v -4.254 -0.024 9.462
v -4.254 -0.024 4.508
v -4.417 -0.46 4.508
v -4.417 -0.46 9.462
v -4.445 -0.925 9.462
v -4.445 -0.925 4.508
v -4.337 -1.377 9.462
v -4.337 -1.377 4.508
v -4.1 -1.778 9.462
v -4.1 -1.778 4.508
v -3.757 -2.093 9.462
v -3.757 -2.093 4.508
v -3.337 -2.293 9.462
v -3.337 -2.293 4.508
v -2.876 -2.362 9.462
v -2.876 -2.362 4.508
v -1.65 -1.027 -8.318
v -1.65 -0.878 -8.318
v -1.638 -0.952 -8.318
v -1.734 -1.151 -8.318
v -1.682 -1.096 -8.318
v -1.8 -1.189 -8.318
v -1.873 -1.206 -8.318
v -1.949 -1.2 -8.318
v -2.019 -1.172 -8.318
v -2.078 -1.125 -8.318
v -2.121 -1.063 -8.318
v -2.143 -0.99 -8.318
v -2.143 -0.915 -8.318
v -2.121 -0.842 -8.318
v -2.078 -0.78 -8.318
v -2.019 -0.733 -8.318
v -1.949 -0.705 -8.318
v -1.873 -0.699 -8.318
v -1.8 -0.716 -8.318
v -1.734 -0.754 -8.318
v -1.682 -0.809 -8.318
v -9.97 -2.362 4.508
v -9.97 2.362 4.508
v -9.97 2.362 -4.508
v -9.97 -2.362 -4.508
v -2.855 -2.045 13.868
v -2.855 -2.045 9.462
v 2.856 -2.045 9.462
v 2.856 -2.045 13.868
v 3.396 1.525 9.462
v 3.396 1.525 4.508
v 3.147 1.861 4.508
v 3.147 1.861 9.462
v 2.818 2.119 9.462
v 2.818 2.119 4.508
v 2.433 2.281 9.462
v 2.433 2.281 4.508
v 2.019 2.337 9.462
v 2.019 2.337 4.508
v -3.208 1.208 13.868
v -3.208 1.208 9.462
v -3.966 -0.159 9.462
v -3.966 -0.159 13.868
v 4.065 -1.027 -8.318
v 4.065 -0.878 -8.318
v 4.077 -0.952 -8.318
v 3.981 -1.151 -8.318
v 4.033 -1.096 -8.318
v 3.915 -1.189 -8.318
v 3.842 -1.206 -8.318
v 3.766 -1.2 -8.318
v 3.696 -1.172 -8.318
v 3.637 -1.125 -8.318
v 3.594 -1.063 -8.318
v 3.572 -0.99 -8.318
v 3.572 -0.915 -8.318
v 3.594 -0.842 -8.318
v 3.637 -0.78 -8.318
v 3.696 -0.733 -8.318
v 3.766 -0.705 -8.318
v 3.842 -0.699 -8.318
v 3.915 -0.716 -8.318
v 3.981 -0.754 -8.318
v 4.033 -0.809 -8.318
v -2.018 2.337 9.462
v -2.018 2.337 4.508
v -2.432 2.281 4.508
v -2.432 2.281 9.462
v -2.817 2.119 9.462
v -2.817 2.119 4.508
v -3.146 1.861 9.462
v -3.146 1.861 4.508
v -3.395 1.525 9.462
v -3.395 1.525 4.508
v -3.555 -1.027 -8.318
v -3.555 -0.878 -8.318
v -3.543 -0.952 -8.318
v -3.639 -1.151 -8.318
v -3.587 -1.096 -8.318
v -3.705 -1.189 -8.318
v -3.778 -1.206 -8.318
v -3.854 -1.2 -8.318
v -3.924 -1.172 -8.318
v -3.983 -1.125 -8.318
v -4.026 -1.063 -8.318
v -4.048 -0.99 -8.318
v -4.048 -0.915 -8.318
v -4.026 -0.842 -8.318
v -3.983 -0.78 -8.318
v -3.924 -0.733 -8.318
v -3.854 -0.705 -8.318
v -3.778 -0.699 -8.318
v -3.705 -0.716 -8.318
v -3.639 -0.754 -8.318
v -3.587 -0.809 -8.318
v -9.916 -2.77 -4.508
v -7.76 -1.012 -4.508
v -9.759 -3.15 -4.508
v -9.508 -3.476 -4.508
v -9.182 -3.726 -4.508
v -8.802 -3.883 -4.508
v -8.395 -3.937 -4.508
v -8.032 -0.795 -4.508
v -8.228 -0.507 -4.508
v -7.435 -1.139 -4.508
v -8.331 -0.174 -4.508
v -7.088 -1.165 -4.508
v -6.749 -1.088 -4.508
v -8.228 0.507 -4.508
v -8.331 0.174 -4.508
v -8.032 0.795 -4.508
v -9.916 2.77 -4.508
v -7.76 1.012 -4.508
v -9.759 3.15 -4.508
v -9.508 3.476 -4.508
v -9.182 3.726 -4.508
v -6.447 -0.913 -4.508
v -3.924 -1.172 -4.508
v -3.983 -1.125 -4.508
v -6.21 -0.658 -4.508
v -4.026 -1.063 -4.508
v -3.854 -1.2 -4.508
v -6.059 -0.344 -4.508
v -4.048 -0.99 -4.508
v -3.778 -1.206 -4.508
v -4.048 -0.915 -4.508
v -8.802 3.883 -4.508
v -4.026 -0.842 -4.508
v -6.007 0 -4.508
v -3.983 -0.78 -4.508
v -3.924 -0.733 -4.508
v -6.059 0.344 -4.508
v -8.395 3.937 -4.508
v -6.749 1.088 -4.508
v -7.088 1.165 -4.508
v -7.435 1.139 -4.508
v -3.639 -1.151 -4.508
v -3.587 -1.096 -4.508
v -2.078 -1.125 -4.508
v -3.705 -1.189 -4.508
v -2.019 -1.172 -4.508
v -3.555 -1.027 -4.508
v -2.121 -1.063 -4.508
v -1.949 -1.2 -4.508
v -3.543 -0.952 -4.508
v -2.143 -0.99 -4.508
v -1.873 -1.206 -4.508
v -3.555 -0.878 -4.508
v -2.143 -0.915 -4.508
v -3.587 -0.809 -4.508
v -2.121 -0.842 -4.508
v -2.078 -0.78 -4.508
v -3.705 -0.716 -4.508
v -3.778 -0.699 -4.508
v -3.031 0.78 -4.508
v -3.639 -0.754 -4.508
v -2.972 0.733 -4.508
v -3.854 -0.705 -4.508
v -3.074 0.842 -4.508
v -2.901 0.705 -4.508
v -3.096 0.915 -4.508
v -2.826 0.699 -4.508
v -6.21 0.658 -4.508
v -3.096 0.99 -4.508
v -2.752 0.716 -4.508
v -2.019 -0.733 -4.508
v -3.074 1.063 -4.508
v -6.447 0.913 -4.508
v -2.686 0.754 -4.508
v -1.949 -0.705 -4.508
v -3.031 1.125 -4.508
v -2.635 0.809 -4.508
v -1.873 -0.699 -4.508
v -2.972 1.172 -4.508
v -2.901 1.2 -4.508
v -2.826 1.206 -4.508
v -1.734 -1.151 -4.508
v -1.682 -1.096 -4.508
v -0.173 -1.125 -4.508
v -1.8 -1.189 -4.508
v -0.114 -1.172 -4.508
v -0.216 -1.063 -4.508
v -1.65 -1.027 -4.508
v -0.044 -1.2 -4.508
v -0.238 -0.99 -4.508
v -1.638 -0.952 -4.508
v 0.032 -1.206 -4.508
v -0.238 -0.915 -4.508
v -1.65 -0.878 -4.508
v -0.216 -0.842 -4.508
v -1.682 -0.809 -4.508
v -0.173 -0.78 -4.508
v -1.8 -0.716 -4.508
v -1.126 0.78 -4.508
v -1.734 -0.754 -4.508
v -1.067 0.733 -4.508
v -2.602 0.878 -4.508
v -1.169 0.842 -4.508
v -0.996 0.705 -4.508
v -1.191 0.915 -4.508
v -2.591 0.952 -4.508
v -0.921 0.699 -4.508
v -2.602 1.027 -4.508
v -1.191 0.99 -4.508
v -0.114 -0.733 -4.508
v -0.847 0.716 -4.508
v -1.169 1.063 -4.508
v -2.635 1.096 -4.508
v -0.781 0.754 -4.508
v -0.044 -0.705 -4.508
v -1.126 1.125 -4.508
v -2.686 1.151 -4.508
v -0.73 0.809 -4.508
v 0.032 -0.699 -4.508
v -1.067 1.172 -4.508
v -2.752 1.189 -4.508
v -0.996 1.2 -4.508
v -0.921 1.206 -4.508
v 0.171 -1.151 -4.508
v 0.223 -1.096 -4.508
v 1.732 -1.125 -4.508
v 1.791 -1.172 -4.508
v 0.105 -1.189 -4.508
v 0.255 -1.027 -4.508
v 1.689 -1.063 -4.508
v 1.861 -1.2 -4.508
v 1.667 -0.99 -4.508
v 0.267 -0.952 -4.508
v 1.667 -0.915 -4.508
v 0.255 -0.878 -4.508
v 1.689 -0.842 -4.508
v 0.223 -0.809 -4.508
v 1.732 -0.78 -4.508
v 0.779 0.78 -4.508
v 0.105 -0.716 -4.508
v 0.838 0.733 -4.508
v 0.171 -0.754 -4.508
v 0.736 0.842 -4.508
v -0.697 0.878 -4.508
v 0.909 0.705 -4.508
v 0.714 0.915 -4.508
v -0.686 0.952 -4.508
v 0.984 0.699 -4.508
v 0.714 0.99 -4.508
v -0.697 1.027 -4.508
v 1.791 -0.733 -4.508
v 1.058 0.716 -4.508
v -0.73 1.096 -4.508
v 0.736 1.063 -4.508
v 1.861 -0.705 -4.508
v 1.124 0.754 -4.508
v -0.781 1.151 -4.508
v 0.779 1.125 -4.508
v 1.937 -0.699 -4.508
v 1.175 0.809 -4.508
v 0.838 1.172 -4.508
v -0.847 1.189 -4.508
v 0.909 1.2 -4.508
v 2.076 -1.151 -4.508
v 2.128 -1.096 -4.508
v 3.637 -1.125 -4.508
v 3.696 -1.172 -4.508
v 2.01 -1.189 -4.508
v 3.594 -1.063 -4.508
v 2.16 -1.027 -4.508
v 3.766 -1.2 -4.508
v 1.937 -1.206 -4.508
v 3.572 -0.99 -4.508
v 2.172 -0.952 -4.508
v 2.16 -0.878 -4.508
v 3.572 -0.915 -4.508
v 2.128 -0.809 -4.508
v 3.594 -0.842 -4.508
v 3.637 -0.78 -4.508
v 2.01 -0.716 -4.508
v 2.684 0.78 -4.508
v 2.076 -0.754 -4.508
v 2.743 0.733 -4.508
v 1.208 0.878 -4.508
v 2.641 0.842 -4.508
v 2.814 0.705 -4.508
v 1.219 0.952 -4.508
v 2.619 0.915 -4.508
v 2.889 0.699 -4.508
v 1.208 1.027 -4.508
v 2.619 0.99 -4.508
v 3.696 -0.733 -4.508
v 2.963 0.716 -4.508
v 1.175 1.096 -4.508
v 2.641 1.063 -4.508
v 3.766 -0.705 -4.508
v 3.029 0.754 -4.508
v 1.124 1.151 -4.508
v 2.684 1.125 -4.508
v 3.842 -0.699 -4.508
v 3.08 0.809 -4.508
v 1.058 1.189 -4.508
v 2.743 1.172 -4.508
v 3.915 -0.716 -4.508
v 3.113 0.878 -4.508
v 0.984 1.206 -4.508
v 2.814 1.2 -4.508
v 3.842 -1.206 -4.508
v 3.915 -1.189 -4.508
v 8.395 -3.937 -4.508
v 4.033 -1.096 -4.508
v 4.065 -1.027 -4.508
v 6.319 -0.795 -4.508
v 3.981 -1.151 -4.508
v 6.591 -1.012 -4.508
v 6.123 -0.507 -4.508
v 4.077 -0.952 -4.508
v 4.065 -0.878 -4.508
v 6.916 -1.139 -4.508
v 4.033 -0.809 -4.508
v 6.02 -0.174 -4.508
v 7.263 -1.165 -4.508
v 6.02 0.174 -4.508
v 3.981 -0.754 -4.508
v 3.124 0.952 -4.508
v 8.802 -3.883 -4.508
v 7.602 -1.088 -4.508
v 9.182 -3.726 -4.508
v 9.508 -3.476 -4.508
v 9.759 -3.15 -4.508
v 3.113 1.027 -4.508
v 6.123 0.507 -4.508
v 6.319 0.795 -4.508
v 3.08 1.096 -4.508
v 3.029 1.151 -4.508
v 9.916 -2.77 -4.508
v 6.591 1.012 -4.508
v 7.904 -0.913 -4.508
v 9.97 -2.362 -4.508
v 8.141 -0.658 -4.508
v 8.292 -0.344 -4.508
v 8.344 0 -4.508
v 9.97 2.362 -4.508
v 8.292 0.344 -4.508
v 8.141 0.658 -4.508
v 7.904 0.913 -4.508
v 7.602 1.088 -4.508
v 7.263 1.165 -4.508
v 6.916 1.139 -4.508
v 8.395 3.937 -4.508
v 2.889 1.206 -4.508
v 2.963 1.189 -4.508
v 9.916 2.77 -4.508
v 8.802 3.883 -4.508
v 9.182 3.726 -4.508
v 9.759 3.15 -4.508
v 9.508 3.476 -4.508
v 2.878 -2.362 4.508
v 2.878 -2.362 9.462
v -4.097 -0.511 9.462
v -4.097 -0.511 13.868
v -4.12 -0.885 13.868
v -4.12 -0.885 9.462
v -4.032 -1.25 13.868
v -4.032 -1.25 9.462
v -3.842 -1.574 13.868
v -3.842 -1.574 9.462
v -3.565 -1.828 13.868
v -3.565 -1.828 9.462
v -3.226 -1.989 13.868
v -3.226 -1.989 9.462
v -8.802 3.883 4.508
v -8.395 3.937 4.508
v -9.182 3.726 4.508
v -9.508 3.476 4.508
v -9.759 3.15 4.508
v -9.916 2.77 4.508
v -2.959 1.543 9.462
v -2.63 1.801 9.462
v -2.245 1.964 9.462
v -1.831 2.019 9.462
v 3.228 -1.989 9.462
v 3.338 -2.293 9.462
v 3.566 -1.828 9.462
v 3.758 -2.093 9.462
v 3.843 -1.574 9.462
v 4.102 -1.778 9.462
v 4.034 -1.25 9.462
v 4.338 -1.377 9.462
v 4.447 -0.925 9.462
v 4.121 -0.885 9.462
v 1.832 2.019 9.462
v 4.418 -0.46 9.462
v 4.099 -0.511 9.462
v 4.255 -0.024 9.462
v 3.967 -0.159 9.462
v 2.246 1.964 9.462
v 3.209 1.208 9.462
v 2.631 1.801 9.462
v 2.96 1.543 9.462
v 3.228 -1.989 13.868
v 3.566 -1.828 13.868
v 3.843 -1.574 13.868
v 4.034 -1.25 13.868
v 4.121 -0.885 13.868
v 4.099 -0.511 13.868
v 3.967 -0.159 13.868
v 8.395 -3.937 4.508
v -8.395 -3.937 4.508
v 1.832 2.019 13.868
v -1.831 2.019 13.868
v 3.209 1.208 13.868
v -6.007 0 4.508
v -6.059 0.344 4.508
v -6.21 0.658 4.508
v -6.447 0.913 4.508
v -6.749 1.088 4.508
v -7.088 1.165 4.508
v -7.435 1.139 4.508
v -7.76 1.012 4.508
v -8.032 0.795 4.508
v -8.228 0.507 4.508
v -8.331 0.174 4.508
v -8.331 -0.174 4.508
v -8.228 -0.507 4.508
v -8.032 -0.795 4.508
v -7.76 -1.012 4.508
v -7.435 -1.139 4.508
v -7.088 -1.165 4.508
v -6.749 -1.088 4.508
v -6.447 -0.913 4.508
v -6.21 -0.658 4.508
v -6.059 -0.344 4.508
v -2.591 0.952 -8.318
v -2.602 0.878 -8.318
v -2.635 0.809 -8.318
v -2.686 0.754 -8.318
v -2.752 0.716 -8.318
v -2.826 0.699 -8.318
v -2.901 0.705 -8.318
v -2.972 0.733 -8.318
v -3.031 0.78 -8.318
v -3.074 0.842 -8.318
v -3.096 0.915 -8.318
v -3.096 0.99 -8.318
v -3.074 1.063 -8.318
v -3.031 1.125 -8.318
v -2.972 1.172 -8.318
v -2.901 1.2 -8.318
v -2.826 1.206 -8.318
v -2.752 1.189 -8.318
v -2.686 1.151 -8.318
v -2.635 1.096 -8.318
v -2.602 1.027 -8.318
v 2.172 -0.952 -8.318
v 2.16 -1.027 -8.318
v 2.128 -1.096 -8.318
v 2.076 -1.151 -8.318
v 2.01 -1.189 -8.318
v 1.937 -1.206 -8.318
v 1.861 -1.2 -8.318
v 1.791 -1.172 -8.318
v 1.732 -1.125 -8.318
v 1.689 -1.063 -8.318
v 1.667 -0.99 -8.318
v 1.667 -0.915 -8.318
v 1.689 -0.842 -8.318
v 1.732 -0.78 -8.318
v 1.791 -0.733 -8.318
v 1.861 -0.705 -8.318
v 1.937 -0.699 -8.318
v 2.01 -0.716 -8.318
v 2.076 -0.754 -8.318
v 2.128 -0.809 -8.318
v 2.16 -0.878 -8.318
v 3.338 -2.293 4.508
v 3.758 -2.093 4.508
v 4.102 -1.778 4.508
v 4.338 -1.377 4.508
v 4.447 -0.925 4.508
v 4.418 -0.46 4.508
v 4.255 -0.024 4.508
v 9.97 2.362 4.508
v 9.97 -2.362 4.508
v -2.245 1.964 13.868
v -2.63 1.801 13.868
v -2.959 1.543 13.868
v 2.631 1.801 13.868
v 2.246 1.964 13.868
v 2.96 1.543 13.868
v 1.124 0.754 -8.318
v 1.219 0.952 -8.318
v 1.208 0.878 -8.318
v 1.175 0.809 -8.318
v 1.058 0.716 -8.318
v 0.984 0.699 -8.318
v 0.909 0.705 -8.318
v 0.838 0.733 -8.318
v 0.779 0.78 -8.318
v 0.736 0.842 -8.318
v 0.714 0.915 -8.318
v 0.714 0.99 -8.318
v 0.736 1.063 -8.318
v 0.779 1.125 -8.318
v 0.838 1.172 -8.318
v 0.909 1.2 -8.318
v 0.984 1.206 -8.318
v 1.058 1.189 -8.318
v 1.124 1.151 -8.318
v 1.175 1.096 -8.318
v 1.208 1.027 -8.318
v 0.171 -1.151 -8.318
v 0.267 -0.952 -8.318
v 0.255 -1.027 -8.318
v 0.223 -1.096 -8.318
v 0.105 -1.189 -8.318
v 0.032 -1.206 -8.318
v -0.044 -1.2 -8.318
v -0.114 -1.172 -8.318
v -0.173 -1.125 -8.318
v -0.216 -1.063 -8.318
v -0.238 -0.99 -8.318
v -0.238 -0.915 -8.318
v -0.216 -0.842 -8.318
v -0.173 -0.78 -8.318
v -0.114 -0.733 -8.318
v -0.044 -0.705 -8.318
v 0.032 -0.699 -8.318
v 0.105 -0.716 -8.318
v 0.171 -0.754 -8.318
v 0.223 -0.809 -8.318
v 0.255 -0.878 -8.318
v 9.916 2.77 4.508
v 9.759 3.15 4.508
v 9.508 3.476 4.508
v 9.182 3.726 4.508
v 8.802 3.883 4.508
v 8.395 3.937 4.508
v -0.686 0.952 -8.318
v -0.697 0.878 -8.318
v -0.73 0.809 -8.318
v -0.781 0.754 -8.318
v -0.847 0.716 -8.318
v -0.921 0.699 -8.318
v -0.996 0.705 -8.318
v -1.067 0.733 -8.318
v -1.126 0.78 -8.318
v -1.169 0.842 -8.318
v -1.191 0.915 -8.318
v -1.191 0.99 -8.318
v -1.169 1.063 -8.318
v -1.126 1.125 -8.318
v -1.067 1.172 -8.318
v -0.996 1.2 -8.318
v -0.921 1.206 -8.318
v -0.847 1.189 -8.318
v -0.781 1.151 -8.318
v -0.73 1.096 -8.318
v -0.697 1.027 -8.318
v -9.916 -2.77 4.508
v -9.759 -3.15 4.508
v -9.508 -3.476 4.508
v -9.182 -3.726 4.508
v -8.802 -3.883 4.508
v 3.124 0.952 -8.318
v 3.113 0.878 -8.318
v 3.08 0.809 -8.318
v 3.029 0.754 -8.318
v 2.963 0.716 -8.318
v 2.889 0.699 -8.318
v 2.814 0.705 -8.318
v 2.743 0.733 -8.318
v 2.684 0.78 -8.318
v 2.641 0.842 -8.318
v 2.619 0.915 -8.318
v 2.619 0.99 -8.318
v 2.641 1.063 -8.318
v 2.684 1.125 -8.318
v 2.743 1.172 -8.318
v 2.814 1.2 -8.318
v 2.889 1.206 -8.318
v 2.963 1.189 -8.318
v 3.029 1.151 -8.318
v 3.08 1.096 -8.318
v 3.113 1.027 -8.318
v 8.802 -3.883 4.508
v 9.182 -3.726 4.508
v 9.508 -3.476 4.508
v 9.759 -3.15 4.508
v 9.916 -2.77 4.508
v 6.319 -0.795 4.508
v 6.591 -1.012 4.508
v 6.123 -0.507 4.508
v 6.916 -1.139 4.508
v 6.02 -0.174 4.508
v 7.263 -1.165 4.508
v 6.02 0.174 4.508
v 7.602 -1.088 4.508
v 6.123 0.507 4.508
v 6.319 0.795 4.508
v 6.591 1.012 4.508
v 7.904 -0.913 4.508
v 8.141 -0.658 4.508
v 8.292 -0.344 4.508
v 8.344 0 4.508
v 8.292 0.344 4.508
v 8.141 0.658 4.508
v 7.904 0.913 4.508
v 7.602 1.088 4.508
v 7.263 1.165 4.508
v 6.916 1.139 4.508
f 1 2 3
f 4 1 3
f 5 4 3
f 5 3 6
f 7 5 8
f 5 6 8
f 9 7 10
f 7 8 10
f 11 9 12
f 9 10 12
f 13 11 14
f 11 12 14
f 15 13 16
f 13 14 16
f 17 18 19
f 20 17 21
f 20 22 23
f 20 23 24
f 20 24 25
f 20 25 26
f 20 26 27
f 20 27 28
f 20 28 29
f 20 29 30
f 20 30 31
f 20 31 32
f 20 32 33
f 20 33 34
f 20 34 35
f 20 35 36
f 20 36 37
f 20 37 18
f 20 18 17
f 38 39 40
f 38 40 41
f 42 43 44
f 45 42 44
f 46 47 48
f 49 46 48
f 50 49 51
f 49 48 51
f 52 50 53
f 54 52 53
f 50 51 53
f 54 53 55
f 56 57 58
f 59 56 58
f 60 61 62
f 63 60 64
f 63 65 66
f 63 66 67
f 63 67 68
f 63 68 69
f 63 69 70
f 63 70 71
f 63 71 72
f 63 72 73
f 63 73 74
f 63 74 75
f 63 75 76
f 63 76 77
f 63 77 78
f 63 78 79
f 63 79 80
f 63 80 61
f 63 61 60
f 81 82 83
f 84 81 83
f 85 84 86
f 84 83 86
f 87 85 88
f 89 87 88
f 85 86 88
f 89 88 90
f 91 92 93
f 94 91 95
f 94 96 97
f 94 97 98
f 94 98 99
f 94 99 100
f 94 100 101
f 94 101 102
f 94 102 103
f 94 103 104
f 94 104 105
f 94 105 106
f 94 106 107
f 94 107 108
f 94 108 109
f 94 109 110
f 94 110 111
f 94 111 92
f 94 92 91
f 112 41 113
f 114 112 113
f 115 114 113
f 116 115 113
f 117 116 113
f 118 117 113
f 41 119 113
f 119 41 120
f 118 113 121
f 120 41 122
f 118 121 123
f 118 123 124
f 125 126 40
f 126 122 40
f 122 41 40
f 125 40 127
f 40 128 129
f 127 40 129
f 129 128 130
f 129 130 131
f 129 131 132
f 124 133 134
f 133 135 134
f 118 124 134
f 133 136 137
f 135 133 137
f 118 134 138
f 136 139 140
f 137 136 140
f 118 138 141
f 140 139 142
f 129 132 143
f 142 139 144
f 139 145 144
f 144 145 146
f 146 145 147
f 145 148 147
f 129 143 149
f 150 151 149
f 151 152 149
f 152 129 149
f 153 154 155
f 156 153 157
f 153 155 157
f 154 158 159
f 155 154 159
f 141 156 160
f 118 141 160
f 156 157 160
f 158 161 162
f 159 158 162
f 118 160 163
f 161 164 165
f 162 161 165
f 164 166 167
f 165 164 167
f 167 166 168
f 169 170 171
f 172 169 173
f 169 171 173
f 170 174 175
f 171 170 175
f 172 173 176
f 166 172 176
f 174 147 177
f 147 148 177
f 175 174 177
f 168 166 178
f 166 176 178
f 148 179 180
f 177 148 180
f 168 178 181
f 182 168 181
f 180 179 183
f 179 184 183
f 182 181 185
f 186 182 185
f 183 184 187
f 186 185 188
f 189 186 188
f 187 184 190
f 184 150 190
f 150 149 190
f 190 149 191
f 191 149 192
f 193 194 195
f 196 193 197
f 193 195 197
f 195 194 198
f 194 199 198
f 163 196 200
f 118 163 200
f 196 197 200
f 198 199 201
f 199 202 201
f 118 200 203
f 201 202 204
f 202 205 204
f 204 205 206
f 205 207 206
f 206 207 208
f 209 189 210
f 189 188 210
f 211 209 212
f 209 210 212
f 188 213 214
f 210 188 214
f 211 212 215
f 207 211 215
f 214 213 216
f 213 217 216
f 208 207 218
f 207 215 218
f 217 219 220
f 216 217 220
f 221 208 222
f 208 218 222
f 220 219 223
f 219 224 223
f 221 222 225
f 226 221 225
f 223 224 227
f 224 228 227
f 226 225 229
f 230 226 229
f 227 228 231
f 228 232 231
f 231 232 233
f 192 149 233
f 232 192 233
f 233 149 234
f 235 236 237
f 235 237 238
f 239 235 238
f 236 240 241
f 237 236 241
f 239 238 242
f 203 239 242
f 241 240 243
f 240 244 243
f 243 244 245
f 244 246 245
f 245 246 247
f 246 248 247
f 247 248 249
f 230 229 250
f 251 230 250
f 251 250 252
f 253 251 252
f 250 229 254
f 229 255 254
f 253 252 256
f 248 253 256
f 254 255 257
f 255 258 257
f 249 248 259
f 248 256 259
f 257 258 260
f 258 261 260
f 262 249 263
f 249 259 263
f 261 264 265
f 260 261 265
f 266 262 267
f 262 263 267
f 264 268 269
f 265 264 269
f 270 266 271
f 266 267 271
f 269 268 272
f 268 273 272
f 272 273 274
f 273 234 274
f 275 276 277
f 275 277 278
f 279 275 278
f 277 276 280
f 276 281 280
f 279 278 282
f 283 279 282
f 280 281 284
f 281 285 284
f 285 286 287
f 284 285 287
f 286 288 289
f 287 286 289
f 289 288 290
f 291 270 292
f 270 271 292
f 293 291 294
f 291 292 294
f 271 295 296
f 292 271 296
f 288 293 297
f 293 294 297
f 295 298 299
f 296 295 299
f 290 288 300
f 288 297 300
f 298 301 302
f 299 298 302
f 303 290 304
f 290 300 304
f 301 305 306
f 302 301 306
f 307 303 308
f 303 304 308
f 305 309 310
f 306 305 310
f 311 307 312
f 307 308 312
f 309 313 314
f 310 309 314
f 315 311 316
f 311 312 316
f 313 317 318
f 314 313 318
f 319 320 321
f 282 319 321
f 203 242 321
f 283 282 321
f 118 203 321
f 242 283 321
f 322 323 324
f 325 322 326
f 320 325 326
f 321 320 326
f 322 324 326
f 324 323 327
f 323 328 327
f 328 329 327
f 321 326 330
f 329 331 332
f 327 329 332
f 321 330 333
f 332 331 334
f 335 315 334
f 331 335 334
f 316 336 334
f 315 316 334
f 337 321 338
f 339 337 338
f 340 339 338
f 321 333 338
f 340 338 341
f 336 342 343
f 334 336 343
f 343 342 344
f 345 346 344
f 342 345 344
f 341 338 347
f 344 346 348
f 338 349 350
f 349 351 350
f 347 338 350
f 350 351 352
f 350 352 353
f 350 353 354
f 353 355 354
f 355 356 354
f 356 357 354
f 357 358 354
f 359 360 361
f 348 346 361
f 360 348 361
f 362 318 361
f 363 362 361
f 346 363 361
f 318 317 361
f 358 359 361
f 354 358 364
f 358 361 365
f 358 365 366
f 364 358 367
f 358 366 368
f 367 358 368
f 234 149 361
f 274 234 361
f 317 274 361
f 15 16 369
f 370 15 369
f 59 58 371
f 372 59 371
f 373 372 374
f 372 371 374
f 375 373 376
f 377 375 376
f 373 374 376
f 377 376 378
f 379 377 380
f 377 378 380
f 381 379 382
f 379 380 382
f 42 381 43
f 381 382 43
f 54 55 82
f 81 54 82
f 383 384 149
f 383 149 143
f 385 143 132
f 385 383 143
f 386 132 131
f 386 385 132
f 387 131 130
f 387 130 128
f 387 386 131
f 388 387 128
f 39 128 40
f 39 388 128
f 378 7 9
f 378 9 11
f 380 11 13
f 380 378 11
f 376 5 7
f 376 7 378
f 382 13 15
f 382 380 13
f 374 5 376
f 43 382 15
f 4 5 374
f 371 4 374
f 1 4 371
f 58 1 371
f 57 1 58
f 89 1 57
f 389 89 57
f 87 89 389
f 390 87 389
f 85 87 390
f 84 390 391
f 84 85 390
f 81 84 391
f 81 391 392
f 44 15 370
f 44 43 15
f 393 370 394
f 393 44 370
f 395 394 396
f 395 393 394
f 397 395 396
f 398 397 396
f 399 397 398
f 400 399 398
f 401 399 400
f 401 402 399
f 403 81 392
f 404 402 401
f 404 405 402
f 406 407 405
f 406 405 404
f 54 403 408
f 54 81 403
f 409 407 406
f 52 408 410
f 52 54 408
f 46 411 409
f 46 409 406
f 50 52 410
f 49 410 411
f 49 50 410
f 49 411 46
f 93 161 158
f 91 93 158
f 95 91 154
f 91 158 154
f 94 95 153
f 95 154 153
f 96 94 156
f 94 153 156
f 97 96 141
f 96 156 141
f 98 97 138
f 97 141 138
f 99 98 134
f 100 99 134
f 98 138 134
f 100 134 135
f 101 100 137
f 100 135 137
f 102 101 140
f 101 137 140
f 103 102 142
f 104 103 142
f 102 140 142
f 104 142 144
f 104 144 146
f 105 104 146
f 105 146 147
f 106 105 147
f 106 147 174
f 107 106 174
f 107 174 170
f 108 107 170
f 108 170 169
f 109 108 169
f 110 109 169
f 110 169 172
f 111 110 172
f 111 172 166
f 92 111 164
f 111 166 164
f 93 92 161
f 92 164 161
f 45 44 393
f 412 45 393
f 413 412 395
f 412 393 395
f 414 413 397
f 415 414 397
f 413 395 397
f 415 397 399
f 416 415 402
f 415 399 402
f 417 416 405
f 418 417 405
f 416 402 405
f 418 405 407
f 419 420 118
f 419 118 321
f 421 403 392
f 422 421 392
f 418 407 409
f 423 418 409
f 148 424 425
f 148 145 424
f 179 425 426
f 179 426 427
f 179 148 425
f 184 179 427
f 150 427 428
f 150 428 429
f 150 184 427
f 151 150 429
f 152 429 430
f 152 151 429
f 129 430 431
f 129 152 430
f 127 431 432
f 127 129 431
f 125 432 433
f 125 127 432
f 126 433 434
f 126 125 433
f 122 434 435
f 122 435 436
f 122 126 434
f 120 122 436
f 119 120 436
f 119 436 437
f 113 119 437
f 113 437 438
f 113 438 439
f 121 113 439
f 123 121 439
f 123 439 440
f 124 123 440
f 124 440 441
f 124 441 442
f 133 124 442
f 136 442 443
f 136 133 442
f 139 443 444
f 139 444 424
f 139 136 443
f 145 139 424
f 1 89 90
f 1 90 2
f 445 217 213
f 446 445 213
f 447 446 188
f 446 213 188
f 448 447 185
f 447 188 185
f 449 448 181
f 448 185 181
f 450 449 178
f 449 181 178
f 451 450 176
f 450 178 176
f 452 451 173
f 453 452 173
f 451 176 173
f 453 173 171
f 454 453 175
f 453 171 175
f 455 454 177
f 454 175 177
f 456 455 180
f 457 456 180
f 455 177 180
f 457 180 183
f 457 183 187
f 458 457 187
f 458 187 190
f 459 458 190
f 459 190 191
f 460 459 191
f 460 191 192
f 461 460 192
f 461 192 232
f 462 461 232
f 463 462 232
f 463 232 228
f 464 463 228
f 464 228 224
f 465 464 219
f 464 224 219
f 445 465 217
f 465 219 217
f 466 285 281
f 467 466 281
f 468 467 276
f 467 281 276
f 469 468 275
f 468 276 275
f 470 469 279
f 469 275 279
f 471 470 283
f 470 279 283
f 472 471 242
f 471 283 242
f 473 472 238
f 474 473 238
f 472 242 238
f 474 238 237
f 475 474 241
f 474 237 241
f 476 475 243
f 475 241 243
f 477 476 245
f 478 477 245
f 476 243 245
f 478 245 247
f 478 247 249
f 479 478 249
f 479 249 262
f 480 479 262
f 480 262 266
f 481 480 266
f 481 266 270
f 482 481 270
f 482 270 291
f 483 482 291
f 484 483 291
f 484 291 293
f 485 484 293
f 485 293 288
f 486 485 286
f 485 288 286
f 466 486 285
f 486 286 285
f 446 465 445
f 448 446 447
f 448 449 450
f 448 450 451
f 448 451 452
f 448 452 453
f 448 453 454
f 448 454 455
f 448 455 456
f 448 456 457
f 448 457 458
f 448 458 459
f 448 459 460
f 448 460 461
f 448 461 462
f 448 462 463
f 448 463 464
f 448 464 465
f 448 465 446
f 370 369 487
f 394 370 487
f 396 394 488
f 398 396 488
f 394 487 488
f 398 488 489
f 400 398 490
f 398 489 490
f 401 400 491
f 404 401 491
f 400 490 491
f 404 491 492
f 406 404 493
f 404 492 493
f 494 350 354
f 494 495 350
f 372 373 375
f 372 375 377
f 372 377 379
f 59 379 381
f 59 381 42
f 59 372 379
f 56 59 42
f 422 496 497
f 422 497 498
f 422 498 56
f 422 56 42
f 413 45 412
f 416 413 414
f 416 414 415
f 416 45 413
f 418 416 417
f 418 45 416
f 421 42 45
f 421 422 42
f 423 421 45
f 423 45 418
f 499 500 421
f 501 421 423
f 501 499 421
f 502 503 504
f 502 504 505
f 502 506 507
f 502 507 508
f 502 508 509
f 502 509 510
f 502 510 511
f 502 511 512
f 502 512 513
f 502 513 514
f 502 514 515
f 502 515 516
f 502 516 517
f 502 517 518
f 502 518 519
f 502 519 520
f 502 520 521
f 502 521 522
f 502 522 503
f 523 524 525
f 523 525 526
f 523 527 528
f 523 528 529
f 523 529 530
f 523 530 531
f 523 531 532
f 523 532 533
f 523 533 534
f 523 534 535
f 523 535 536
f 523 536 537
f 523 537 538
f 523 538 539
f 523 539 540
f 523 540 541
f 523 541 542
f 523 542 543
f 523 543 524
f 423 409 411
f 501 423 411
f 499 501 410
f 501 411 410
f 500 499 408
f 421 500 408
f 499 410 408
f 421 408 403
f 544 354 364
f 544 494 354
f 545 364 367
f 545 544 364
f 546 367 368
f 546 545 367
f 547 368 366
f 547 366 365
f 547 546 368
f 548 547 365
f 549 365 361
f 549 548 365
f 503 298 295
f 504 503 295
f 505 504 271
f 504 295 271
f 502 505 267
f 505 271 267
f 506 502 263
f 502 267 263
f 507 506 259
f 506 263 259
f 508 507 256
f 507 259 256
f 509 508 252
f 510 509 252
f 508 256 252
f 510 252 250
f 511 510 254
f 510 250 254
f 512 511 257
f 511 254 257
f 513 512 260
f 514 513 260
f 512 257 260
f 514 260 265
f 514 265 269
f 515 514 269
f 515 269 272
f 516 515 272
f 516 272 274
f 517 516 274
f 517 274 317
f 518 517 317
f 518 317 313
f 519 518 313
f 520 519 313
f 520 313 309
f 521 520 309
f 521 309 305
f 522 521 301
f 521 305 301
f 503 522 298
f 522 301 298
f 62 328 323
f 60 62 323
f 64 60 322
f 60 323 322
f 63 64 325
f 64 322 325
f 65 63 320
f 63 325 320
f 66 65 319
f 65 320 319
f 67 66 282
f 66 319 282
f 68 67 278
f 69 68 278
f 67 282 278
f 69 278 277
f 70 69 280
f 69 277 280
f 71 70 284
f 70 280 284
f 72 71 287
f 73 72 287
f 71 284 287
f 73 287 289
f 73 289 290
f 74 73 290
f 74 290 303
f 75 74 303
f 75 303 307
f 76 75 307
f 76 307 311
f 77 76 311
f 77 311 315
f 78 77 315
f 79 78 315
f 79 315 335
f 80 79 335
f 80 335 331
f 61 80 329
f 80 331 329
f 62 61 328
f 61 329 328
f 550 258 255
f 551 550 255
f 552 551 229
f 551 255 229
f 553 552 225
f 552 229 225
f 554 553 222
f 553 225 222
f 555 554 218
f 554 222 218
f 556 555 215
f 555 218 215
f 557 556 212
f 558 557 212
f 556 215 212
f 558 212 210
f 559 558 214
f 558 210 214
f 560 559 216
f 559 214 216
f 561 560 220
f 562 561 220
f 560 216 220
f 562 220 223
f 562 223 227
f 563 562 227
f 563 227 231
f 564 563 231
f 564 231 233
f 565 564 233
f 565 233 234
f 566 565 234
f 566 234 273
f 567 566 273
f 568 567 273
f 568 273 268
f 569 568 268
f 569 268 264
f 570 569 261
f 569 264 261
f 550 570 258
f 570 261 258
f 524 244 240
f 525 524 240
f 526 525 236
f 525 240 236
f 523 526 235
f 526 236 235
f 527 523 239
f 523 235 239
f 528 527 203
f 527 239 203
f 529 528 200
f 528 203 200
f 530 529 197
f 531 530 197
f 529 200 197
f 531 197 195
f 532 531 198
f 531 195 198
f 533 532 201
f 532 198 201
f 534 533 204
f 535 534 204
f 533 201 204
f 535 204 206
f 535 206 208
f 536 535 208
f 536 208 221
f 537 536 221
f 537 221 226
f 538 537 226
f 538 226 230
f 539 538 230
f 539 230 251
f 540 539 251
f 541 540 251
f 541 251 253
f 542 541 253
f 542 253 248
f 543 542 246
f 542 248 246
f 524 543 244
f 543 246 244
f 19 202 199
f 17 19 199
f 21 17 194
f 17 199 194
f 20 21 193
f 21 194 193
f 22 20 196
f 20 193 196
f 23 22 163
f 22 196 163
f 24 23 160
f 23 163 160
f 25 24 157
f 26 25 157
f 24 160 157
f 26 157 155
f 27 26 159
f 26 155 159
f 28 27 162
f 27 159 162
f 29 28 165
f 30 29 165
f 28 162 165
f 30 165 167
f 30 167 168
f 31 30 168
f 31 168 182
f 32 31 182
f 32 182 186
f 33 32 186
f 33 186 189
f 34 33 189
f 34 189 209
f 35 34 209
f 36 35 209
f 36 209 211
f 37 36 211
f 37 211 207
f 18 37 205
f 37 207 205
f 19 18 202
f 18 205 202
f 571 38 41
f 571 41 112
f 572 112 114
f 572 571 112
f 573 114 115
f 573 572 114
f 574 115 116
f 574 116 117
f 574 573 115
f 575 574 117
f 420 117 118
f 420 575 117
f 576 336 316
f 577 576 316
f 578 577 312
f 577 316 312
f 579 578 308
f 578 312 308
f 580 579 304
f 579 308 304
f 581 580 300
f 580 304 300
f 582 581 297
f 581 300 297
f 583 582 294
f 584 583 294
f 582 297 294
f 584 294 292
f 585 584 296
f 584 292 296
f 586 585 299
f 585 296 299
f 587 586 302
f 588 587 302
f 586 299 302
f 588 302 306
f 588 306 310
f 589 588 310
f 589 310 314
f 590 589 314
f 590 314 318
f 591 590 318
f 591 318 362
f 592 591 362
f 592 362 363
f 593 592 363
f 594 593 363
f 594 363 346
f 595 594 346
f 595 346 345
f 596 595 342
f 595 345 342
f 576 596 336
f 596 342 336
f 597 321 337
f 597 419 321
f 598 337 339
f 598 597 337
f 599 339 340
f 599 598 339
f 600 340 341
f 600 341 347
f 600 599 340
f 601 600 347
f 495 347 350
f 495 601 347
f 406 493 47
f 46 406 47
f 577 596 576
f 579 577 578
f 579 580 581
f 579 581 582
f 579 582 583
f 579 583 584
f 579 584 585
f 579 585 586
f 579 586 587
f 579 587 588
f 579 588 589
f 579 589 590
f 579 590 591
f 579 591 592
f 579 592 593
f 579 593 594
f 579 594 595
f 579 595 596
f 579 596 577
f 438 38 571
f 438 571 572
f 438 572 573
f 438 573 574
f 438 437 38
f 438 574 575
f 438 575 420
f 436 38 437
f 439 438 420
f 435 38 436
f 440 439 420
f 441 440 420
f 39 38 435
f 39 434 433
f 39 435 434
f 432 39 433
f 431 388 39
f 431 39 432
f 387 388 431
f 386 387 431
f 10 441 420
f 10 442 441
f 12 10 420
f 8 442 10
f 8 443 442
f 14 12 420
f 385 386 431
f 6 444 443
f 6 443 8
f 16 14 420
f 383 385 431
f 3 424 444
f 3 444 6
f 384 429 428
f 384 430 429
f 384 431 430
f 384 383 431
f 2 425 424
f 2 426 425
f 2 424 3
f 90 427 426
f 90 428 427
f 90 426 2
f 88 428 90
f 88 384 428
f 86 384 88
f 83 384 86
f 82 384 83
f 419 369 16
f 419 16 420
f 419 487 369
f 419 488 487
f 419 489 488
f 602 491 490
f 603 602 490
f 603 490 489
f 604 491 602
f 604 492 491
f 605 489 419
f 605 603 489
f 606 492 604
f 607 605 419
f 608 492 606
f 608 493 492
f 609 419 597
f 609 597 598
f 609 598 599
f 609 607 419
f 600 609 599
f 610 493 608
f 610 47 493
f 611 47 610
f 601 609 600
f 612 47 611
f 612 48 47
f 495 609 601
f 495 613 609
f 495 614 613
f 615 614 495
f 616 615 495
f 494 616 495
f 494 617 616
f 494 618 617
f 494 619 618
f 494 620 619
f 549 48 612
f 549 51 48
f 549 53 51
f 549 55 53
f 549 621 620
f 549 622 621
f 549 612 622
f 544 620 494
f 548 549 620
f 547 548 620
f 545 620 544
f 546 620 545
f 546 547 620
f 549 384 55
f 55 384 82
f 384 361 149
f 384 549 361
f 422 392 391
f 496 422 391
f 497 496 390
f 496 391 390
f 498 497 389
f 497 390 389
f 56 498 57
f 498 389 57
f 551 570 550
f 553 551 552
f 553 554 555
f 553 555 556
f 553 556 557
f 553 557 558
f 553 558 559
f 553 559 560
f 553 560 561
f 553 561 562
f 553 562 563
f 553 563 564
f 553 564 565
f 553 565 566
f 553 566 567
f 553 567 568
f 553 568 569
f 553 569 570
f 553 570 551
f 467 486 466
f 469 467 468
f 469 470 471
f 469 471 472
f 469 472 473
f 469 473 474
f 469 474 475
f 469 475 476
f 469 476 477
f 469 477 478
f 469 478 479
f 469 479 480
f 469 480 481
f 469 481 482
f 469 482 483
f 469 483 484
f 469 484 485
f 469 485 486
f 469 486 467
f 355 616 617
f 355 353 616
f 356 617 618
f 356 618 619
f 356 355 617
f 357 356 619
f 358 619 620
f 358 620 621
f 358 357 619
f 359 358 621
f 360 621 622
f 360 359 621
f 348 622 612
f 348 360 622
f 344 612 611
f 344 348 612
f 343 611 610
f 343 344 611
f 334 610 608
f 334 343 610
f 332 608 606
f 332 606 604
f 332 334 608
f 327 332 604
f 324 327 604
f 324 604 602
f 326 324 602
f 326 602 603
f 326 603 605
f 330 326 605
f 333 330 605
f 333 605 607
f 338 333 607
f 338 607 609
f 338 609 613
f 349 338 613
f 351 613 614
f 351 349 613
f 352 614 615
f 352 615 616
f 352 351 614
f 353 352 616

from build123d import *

# Parameters (mm, degrees)
F0_R     = 1.1684
F1_DEPTH = 4.5085
F3_DEPTH = 4.953
F5_DEPTH = 4.4069
F6_R     = 0.254
F7_DEPTH = 3.81


with BuildPart() as f1:
    # F0 (on Top) → F1 (new body, symmetric)
    with BuildSketch(Plane.XY):
        with BuildLine():
            Line((8.3947, 3.937), (-8.3947, 3.937))
            ThreePointArc((-8.3947, 3.937), (-9.508252, 3.475752), (-9.9695, 2.3622))
            Line((-9.9695, 2.3622), (-9.9695, -2.3622))
            ThreePointArc((-9.9695, -2.3622), (-9.508252, -3.475752), (-8.3947, -3.937))
            Line((-8.3947, -3.937), (8.3947, -3.937))
            ThreePointArc((8.3947, -3.937), (9.508252, -3.475752), (9.9695, -2.3622))
            Line((9.9695, -2.3622), (9.9695, 2.3622))
            ThreePointArc((9.9695, 2.3622), (9.508252, 3.475752), (8.3947, 3.937))
        make_face()
        with Locations((-7.1755, 0)):
            Circle(F0_R, mode=Mode.SUBTRACT)
        with Locations((7.1755, 0)):
            Circle(F0_R, mode=Mode.SUBTRACT)
    extrude(amount=F1_DEPTH, both=True)

    # F2 (on face) → F3 (join)
    with BuildSketch(Plane.XY.offset(4.5085)):
        with BuildLine():
            Line((-2.87642, -2.3622), (2.877878, -2.3622))
            ThreePointArc((2.877878, -2.3622), (4.234771, -1.586671), (4.255229, -0.023922))
            Line((4.255229, -0.023922), (3.396382, 1.525478))
            ThreePointArc((3.396382, 1.525478), (2.818303, 2.118894), (2.019031, 2.3368))
            Line((2.019031, 2.3368), (-2.017574, 2.3368))
            ThreePointArc((-2.017574, 2.3368), (-2.816845, 2.118894), (-3.394925, 1.525478))
            Line((-3.394925, 1.525478), (-4.253771, -0.023922))
            ThreePointArc((-4.253771, -0.023922), (-4.233314, -1.586671), (-2.87642, -2.3622))
        make_face()
    extrude(amount=F3_DEPTH)

    # F4 (on face) → F5 (join)
    with BuildSketch(Plane.XY.offset(9.4615)):
        with BuildLine():
            Line((1.832009, 2.0193), (-1.830552, 2.0193))
            ThreePointArc((-1.830552, 2.0193), (-2.629823, 1.801394), (-3.207903, 1.207978))
            Line((-3.207903, 1.207978), (-3.965627, -0.158992))
            ThreePointArc((-3.965627, -0.158992), (-3.949129, -1.419274), (-2.85486, -2.0447))
            Line((-2.85486, -2.0447), (2.856317, -2.0447))
            ThreePointArc((2.856317, -2.0447), (3.950586, -1.419274), (3.967084, -0.158992))
            Line((3.967084, -0.158992), (3.209361, 1.207978))
            ThreePointArc((3.209361, 1.207978), (2.631281, 1.801394), (1.832009, 2.0193))
        make_face()
    extrude(amount=F5_DEPTH)

    # F6 (on face) → F7 (join)
    with BuildSketch(Plane(origin=(0, 0, -4.5085), x_dir=(1, 0, 0), z_dir=(0, 0, -1))):
        with Locations((-3.7973, 0.9525)):
            Circle(F6_R)
        with Locations((-1.8923, 0.9525)):
            Circle(F6_R)
        with Locations((0.0127, 0.9525)):
            Circle(F6_R)
        with Locations((1.9177, 0.9525)):
            Circle(F6_R)
        with Locations((3.8227, 0.9525)):
            Circle(F6_R)
        with Locations((-2.8448, -0.9525)):
            Circle(F6_R)
        with Locations((-0.9398, -0.9525)):
            Circle(F6_R)
        with Locations((0.9652, -0.9525)):
            Circle(F6_R)
        with Locations((2.8702, -0.9525)):
            Circle(F6_R)
    extrude(amount=F7_DEPTH)


solid = f1.part
